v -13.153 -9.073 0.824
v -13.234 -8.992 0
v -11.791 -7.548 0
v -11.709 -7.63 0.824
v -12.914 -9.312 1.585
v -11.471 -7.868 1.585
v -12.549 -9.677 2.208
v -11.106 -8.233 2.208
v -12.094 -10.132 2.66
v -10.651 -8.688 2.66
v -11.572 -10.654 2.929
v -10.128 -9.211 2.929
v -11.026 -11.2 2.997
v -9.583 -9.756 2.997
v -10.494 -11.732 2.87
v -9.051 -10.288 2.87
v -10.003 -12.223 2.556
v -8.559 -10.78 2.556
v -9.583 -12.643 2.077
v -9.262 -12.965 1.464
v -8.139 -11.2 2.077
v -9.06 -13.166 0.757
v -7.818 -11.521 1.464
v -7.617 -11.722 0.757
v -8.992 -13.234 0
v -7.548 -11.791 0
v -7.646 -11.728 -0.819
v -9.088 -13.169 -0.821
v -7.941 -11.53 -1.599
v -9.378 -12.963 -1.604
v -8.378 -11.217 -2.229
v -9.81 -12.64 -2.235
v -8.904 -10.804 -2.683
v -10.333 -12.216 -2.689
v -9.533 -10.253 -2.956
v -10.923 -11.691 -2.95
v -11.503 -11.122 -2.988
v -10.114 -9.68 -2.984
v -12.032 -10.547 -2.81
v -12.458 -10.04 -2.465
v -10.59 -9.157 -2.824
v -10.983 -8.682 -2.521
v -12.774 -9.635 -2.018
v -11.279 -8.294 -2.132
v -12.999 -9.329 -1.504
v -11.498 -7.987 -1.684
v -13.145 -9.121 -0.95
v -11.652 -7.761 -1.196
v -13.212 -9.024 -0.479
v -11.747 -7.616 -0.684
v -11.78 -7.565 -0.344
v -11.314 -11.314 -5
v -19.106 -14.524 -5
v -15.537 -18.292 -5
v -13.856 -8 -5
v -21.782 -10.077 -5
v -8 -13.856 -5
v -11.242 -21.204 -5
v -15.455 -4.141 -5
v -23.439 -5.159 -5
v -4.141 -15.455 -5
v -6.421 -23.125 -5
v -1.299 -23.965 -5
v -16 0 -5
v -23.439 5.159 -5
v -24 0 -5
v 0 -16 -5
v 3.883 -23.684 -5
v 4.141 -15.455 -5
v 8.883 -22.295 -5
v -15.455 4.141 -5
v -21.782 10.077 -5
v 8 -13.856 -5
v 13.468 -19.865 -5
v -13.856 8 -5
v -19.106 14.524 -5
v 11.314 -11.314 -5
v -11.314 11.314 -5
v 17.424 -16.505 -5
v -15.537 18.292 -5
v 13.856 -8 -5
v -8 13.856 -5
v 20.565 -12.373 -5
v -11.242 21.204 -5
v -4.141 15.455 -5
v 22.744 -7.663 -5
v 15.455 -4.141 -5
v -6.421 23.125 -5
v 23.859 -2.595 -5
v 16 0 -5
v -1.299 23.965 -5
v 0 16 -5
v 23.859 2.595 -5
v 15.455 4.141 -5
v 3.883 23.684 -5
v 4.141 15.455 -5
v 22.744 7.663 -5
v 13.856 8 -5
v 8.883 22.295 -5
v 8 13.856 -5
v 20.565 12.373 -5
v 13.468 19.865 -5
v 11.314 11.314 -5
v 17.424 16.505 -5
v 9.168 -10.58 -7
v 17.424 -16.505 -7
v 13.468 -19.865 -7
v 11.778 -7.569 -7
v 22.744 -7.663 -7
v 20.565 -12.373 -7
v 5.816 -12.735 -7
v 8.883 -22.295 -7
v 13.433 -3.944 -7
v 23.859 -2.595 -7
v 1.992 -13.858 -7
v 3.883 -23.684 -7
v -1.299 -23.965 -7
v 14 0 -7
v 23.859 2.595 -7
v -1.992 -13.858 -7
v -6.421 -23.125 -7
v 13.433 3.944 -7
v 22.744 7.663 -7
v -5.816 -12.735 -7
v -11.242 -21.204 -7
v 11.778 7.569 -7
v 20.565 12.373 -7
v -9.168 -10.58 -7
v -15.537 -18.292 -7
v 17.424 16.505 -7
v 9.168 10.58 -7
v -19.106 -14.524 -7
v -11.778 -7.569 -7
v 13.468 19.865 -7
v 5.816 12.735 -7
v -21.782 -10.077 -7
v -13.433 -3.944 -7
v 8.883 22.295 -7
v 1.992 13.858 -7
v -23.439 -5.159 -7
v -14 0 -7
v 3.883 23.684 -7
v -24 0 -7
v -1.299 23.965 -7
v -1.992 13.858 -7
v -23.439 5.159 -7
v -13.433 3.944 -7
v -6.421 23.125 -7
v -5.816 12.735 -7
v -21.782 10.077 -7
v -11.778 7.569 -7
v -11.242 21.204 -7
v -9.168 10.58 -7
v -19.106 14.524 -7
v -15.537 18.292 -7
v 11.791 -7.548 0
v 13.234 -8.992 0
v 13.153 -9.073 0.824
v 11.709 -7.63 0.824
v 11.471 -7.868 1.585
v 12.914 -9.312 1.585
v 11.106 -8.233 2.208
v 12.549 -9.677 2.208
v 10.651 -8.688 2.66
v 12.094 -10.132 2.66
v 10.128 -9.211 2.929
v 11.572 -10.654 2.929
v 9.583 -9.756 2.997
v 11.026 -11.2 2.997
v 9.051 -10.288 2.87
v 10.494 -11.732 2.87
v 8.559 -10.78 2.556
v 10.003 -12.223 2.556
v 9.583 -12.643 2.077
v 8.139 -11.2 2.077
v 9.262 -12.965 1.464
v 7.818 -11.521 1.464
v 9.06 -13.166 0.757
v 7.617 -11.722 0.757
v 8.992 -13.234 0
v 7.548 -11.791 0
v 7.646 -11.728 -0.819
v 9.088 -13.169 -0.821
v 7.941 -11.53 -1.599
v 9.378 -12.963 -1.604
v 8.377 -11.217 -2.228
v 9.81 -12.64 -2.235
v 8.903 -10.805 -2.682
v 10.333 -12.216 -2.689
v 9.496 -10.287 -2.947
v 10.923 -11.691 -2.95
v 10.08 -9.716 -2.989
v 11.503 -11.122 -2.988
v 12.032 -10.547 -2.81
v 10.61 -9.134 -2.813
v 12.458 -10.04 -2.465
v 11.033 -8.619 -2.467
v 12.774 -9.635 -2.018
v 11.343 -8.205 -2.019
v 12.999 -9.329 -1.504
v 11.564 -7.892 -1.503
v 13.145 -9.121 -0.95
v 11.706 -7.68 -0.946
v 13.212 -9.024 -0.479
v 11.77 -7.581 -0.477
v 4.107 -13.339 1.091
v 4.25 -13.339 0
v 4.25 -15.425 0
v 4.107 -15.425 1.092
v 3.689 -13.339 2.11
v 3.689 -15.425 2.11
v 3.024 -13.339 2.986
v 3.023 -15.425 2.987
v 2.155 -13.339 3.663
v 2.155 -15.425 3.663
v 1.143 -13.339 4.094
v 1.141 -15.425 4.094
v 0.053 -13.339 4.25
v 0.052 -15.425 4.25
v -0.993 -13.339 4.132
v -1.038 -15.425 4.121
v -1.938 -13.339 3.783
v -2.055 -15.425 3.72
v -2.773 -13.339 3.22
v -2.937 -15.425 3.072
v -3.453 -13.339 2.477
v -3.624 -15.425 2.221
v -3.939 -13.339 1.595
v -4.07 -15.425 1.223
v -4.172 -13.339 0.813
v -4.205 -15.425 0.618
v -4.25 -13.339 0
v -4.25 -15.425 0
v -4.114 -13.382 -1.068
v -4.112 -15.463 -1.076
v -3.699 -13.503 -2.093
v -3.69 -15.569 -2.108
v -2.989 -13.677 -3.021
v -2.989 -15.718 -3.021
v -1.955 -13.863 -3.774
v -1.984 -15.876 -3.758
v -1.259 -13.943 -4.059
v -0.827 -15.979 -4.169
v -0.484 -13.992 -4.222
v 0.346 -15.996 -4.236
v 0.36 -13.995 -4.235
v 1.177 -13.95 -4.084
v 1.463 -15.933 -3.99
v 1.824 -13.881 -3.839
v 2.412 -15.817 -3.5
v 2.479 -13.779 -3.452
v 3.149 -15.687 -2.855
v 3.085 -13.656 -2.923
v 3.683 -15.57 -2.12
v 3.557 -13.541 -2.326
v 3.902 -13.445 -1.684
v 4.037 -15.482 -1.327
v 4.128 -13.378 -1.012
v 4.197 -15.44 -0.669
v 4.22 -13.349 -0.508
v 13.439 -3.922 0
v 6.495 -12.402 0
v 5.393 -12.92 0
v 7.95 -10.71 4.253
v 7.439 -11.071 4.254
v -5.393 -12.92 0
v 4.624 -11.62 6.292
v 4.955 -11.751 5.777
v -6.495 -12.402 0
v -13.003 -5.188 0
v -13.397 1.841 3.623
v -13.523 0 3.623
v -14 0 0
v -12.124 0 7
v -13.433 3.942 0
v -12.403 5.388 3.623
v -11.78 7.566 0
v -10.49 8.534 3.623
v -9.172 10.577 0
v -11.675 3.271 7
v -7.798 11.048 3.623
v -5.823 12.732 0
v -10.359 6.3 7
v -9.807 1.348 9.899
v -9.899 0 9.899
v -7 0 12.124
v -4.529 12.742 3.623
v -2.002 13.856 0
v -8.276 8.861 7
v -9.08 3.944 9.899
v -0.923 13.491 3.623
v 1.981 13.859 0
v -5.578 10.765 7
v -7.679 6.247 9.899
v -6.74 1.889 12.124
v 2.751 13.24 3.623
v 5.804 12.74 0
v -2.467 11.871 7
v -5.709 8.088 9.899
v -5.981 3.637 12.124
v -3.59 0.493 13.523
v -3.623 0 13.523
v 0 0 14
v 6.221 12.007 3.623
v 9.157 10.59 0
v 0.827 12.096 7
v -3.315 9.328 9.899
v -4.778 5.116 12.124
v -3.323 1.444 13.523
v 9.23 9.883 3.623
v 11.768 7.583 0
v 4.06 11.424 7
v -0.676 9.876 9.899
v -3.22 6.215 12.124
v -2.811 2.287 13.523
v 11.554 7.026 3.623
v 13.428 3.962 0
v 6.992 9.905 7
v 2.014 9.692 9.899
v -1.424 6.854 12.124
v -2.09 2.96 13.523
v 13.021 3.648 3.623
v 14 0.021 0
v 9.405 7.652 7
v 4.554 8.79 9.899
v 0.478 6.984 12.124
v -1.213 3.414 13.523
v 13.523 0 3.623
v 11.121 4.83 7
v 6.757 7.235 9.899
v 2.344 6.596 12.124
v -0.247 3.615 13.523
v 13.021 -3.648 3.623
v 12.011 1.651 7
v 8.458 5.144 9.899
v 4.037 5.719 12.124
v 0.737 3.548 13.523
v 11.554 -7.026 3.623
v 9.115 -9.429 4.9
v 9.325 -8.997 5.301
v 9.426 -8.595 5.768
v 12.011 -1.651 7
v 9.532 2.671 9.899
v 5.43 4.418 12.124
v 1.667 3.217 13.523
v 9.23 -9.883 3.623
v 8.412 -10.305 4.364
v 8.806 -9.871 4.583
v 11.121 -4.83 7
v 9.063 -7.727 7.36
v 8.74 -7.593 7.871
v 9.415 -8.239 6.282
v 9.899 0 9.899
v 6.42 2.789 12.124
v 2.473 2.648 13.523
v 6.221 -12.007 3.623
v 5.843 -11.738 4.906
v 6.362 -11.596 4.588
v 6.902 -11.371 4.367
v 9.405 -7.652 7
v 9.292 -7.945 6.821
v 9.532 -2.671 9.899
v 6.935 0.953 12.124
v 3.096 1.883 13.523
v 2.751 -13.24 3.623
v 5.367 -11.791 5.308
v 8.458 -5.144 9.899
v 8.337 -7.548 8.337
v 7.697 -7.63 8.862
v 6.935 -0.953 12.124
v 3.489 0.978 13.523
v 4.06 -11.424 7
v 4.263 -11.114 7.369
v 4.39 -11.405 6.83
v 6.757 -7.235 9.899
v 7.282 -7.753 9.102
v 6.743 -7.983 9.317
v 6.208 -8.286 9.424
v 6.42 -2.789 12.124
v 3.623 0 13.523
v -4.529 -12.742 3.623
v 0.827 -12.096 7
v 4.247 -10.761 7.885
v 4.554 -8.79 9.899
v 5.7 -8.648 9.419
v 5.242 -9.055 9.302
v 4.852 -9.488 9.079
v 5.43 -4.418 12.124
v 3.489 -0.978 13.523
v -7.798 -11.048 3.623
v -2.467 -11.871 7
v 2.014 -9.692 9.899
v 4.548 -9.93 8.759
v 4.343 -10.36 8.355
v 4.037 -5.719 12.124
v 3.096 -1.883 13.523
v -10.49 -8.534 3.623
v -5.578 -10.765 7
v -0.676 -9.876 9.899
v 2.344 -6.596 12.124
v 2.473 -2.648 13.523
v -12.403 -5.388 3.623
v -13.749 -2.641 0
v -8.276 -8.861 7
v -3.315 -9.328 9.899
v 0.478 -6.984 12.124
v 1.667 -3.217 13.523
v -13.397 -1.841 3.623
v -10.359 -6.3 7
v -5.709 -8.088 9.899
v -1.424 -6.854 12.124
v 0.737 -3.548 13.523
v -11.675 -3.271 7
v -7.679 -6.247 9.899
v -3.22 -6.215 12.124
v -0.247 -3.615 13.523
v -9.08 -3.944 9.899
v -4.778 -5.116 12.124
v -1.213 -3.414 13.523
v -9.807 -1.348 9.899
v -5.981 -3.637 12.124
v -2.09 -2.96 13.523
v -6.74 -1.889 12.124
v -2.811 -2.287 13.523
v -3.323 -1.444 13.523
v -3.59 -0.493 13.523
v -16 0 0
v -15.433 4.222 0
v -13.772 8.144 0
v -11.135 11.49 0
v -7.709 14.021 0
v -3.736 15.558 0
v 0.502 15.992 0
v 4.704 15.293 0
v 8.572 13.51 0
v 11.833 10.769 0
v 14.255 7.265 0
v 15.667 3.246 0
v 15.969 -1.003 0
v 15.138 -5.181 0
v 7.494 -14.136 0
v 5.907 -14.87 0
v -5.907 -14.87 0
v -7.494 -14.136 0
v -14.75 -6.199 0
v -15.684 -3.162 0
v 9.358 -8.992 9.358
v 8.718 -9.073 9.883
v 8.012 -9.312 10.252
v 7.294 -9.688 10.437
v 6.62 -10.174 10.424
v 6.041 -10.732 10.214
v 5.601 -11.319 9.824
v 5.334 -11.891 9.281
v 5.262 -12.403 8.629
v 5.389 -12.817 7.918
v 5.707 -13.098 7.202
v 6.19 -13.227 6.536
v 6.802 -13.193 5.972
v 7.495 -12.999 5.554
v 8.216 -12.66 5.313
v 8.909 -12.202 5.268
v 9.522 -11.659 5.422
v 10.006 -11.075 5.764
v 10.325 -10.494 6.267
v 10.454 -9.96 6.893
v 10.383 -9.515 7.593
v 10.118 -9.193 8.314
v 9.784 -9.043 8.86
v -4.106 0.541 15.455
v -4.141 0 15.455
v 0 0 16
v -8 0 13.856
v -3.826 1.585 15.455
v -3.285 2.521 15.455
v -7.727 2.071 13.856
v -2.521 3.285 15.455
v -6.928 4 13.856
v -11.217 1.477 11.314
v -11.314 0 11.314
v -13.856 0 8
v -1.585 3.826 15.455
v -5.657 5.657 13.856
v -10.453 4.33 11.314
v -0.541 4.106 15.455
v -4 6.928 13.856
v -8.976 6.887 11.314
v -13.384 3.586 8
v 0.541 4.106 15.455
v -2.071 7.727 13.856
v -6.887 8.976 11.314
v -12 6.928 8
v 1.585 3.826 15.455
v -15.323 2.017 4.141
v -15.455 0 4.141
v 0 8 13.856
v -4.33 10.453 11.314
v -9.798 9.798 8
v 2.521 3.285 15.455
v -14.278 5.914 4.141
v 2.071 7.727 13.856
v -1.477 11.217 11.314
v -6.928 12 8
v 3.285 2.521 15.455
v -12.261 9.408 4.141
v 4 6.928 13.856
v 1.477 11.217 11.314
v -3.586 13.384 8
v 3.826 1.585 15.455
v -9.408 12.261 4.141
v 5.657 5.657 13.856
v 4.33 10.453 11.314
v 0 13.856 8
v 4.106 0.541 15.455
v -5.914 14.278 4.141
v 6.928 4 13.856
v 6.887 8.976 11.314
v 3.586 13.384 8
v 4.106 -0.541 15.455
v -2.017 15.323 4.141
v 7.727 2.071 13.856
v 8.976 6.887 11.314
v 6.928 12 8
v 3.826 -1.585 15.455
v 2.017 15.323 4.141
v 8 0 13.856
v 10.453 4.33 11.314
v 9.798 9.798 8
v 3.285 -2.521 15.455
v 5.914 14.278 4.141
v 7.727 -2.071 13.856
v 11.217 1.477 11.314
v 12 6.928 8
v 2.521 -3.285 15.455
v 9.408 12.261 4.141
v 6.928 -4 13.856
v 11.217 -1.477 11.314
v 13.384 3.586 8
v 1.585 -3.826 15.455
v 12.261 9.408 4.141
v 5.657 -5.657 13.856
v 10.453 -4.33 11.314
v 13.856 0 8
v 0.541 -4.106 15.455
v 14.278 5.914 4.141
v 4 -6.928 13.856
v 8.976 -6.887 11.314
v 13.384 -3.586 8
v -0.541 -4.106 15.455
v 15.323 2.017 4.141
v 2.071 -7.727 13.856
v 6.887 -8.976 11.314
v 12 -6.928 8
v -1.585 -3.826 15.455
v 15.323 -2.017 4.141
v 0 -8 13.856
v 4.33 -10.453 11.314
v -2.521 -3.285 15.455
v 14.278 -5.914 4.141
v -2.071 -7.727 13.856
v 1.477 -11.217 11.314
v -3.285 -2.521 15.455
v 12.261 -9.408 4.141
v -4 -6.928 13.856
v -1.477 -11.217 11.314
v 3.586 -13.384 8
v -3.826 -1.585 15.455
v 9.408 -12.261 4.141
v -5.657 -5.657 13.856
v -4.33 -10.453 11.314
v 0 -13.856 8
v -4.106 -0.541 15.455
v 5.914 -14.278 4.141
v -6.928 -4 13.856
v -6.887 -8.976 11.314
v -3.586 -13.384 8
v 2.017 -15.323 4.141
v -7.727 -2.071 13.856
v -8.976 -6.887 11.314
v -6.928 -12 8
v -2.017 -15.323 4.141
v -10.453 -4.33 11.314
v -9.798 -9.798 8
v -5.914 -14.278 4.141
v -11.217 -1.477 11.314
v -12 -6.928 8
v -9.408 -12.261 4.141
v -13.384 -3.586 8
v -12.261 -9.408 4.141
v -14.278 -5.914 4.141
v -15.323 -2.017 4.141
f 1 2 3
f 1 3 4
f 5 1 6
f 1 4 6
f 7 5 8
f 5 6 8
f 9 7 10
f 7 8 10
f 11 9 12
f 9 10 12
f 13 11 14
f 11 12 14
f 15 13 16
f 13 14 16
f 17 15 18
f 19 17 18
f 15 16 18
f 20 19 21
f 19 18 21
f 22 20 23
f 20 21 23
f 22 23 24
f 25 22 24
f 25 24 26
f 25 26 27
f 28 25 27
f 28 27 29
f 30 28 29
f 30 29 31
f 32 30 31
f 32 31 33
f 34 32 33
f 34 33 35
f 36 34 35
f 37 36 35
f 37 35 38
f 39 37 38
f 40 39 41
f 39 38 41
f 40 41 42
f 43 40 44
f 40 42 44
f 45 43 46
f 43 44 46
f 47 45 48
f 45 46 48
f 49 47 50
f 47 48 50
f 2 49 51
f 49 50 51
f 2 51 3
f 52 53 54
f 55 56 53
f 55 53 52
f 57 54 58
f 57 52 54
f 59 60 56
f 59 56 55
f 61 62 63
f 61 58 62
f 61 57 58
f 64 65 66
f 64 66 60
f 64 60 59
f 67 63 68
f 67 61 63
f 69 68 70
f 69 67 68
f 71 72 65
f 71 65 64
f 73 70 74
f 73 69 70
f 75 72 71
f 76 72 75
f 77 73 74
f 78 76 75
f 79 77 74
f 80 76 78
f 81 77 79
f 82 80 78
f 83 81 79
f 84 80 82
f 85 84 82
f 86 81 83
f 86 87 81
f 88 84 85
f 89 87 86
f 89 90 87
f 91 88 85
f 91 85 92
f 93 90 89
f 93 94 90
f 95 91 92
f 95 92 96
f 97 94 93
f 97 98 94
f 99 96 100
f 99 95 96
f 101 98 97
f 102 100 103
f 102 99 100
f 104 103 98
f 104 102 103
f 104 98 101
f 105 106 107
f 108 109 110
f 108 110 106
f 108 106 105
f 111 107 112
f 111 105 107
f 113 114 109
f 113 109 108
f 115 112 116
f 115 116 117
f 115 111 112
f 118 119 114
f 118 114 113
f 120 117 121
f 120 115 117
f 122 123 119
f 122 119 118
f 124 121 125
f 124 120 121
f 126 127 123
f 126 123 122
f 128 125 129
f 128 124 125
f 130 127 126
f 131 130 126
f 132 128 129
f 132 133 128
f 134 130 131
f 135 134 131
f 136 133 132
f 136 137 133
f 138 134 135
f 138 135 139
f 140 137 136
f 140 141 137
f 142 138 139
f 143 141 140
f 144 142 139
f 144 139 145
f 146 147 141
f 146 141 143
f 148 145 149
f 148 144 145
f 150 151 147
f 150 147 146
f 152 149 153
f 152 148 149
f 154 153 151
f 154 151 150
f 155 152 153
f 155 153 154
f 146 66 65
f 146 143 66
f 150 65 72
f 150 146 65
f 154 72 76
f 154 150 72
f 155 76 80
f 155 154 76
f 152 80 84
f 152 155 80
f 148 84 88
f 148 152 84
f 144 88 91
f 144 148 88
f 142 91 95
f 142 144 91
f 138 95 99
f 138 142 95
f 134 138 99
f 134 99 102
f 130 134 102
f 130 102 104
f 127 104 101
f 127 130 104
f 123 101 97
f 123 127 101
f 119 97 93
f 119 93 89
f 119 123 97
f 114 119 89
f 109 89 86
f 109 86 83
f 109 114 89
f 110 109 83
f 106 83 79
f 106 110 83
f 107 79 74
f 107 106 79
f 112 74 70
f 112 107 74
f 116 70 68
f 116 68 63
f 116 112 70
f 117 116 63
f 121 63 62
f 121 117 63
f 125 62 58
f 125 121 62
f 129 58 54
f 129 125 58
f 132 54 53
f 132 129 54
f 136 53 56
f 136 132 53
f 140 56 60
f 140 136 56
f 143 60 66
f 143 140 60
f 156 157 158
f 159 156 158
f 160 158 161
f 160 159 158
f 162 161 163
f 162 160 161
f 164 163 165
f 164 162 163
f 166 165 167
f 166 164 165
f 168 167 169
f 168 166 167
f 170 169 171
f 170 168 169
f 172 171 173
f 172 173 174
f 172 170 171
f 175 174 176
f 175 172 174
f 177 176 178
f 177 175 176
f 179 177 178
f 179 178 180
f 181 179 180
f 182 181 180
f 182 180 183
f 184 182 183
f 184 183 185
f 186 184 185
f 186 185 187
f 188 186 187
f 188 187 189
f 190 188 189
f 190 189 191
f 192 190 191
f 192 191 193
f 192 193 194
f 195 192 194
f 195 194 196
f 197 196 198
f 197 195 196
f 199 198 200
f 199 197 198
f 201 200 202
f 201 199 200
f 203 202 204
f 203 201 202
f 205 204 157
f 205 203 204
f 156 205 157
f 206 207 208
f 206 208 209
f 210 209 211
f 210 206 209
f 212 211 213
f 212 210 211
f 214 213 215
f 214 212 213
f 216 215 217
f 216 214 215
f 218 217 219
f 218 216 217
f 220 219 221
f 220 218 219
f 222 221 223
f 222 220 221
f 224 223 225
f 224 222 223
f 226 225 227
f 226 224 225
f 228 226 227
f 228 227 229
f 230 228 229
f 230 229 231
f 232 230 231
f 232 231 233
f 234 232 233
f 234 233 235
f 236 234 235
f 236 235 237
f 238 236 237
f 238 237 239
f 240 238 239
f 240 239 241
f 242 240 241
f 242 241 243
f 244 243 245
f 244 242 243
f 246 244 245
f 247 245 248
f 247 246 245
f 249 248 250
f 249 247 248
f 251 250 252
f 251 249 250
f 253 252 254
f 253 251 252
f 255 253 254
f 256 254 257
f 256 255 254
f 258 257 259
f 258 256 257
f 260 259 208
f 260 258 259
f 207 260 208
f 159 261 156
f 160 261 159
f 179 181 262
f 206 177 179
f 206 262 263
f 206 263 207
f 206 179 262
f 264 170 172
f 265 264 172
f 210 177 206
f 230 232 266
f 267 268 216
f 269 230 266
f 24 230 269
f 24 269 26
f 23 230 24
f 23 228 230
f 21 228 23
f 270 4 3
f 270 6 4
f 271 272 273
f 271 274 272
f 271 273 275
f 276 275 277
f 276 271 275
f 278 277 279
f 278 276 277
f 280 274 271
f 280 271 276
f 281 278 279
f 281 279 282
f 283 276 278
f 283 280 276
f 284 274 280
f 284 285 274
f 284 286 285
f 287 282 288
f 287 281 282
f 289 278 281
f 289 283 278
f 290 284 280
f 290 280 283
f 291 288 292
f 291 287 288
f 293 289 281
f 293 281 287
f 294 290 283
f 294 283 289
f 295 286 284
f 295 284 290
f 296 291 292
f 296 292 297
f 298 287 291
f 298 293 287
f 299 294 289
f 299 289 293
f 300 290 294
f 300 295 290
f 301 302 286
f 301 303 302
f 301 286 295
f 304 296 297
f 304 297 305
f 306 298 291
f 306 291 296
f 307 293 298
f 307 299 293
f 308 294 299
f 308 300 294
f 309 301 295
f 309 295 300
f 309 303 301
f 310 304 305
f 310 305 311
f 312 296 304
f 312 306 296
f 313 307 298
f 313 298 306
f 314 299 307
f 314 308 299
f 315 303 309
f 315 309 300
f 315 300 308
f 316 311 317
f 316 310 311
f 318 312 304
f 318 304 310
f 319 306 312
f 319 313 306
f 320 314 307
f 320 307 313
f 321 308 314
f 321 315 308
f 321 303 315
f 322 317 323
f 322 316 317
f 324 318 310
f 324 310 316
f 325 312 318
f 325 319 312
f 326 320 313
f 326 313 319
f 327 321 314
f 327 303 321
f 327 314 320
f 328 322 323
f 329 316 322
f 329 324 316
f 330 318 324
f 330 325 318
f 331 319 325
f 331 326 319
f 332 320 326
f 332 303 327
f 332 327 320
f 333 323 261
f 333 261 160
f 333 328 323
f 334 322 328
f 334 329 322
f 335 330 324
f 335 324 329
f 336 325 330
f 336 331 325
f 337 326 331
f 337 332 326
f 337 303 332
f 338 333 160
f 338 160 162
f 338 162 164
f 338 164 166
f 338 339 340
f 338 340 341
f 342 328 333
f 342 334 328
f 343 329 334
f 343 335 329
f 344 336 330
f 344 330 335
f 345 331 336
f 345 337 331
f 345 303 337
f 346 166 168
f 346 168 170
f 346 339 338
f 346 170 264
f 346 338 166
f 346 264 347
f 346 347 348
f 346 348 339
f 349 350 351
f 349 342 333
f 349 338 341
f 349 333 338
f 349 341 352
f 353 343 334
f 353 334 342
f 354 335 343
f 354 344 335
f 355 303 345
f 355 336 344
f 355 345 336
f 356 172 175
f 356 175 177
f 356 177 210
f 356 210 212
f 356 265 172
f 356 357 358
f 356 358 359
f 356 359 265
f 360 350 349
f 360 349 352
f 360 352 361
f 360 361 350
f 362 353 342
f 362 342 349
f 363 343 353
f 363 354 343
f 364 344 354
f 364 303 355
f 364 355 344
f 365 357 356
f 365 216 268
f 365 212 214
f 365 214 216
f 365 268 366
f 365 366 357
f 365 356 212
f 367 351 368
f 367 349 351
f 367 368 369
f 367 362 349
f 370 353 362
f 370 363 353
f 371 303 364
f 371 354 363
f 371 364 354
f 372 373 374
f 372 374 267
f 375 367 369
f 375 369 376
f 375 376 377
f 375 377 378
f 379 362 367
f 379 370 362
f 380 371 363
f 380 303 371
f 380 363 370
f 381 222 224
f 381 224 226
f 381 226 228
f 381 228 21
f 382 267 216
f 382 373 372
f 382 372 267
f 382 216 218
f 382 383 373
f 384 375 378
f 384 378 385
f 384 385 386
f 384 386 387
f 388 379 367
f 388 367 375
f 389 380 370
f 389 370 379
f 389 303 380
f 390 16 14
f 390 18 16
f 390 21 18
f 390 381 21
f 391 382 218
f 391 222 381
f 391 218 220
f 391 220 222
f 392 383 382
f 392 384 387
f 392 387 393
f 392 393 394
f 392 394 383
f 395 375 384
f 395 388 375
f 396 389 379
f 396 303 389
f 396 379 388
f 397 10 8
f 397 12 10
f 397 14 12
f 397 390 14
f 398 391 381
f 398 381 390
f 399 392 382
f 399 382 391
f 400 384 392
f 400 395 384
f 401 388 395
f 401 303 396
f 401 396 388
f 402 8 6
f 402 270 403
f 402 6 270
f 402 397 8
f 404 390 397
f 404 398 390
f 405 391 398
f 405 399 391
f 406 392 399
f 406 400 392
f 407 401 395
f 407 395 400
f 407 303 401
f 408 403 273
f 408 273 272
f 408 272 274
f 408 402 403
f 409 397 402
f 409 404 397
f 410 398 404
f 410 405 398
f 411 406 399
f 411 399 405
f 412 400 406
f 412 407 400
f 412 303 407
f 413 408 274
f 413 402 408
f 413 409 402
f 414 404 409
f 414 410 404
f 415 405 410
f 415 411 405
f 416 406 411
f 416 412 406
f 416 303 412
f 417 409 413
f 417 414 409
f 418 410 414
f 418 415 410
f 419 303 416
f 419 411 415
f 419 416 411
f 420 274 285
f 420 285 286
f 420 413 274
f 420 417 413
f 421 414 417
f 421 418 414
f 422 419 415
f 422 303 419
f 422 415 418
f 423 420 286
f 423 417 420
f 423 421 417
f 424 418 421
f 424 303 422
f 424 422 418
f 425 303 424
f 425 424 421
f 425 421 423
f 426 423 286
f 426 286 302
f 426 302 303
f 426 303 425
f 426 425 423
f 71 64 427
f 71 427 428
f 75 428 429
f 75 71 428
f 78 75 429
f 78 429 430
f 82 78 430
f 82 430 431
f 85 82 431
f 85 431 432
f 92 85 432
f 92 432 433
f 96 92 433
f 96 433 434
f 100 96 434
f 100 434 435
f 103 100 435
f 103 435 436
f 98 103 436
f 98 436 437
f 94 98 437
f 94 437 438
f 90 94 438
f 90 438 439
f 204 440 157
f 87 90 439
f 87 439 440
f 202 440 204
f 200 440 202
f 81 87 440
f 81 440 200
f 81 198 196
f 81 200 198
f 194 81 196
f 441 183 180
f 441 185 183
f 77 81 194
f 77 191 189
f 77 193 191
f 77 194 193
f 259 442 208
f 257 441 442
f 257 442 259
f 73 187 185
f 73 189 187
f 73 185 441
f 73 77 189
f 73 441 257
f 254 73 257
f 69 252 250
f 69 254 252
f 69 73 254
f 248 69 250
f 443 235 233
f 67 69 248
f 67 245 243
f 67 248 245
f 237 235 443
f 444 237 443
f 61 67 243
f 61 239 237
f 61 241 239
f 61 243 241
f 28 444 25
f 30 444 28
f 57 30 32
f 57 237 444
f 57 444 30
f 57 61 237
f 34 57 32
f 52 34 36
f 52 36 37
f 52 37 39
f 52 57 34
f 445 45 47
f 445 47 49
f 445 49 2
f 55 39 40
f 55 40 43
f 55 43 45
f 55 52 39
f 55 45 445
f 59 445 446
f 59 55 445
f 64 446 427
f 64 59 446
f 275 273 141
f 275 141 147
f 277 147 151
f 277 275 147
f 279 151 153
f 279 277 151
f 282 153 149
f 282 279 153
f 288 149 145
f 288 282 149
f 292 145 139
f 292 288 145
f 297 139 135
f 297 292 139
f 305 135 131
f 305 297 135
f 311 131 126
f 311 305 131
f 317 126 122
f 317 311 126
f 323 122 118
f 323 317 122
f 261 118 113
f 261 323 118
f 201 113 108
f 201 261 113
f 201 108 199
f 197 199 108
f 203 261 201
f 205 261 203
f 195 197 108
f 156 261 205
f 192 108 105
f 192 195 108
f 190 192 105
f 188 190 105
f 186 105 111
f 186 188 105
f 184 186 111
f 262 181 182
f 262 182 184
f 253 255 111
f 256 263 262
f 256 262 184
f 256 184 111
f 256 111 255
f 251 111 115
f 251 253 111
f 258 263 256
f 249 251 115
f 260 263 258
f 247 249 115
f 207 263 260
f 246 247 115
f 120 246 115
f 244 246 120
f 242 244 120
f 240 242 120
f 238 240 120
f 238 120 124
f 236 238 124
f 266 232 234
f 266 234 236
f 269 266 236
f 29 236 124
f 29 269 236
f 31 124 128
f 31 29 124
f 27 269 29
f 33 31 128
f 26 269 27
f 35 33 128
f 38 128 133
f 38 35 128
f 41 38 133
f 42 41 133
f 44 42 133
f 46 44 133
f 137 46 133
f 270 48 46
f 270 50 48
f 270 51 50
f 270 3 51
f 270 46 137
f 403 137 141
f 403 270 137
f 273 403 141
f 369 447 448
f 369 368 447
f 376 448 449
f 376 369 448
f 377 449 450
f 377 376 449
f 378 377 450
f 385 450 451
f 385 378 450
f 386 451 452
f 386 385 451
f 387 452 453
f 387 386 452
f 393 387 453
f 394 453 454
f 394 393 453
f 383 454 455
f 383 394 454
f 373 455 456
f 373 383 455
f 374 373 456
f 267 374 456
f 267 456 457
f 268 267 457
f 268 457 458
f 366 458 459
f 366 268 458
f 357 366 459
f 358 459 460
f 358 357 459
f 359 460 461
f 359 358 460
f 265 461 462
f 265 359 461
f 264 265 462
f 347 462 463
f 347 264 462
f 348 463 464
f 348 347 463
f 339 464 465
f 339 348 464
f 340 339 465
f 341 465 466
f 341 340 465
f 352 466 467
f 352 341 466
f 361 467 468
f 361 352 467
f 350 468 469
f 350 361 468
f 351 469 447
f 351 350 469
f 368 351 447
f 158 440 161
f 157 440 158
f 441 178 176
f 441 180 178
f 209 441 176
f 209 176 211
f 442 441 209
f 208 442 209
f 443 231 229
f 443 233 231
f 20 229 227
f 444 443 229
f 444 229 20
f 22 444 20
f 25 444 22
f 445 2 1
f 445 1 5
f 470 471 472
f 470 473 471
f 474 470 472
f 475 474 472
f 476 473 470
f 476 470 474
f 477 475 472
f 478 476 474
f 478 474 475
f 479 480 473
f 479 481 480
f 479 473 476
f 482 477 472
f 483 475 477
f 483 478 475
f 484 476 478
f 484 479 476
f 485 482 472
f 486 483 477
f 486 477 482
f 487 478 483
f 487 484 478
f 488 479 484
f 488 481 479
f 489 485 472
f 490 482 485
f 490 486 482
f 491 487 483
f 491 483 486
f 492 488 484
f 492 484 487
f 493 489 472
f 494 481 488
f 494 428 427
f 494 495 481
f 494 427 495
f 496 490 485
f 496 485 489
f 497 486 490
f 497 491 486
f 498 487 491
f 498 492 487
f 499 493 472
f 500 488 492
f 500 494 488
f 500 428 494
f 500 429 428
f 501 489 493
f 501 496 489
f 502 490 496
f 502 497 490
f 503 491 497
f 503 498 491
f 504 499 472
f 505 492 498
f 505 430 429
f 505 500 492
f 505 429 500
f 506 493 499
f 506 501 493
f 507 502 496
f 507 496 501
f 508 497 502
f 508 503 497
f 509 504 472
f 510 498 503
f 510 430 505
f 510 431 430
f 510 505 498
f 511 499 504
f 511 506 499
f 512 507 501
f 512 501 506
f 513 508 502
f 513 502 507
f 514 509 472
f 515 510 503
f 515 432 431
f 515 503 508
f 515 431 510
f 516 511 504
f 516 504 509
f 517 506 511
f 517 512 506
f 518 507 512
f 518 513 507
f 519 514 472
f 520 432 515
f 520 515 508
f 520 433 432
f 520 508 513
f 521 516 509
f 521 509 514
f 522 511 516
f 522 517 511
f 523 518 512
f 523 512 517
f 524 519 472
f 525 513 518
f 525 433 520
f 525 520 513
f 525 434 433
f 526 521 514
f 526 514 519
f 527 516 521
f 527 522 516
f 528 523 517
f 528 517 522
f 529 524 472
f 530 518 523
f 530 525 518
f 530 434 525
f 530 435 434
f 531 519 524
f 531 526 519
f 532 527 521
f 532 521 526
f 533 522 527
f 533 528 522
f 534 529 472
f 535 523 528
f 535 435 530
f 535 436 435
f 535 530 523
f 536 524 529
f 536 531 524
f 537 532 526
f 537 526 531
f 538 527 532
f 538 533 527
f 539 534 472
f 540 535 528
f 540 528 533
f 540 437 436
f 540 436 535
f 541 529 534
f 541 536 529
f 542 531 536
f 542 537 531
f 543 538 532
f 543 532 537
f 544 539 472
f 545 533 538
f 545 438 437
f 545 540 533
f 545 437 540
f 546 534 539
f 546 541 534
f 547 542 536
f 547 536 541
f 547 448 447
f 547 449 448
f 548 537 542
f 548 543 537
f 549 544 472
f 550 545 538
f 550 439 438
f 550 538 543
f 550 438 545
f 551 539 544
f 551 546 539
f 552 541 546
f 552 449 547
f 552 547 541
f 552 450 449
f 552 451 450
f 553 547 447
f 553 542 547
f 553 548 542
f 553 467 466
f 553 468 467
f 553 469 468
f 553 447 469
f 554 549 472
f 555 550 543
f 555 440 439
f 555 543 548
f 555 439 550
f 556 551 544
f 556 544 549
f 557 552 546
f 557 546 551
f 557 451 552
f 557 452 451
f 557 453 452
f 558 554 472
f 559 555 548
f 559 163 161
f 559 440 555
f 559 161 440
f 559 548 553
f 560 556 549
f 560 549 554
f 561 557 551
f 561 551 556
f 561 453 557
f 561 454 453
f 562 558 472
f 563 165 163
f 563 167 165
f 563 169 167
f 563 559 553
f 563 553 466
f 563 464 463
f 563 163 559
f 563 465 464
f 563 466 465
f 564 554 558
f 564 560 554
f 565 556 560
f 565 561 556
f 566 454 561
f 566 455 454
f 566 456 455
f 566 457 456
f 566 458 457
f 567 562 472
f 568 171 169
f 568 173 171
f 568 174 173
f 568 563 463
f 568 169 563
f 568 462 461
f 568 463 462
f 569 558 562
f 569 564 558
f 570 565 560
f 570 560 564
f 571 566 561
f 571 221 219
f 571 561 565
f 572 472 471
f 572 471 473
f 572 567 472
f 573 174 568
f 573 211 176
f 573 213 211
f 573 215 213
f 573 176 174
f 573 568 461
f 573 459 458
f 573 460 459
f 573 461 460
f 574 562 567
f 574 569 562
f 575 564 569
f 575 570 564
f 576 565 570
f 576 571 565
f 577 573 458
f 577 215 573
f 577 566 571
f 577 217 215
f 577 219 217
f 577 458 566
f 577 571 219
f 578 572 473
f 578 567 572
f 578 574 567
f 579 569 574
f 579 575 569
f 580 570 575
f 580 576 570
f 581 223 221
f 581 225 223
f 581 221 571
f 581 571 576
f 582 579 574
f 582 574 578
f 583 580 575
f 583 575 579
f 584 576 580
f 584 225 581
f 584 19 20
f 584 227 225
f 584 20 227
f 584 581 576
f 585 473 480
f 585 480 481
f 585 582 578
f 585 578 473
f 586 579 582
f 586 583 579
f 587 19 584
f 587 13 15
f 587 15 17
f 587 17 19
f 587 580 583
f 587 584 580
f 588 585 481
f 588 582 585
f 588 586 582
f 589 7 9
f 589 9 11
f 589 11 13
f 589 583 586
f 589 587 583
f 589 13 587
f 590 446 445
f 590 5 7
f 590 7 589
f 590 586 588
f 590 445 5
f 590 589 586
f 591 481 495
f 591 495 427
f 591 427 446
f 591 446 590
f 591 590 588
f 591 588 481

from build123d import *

# Parameters (mm, degrees)
F2_R      = 4.25
F3_DEPTH  = 50
F6_R      = 3
F7_DEPTH  = 25
F13_R     = 3
F14_DEPTH = 25


with BuildPart() as f1:
    # F0 (on Front) → F1 (revolve)
    with BuildSketch(Plane.XZ):
        with BuildLine():
            Line((-24, -7), (-14, -7))
            Line((-14, -7), (-14, 0))
            ThreePointArc((-14, 0), (-9.8994949366, 9.8994949366), (0, 14))
            Line((0, 14), (0, 16))
            ThreePointArc((0, 16), (-11.313708499, 11.313708499), (-16, 0))
            Line((-16, 0), (-16, -5))
            Line((-16, -5), (-24, -5))
            Line((-24, -5), (-24, -7))
        make_face()
    revolve(axis=Axis((0, 0, 15), (0, 0, -1)))

    # F2 (on Front) → F3 (cut)
    with BuildSketch(Plane.XZ):
        Circle(F2_R)
    extrude(amount=F3_DEPTH, mode=Mode.SUBTRACT)

    # F6 (on face) → F7 (cut)
    with BuildSketch(Plane(origin=(0, 0, 0), x_dir=(-0.7071067812, 0.7071067812, 0), z_dir=(0.7071067812, 0.7071067812, 0))):
        Circle(F6_R)
    extrude(amount=-F7_DEPTH, mode=Mode.SUBTRACT)

    # F10 (on face) → F11 (revolve, cut)
    with BuildSketch(Plane(origin=(0, 0, 0), x_dir=(0, -1, 0), z_dir=(-0.7071067812, 0, 0.7071067812))):
        Polygon((3.9985278842, 3.9985278842), (16.6846810101, 16.6846810101), (14.5633606666, 18.8060013537), (1.8772075407, 6.1198482278), align=None)
    revolve(axis=Axis((7.3126186329, -10.3416044472, 7.3126186329), (0.5, -0.7071067812, 0.5)), mode=Mode.SUBTRACT)

    # F13 (on face) → F14 (cut)
    with BuildSketch(Plane(origin=(0, 0, 0), x_dir=(0.7071067812, 0.7071067812, 0), z_dir=(0.7071067812, -0.7071067812, 0))):
        Circle(F13_R)
    extrude(amount=F14_DEPTH, mode=Mode.SUBTRACT)


solid = f1.part
